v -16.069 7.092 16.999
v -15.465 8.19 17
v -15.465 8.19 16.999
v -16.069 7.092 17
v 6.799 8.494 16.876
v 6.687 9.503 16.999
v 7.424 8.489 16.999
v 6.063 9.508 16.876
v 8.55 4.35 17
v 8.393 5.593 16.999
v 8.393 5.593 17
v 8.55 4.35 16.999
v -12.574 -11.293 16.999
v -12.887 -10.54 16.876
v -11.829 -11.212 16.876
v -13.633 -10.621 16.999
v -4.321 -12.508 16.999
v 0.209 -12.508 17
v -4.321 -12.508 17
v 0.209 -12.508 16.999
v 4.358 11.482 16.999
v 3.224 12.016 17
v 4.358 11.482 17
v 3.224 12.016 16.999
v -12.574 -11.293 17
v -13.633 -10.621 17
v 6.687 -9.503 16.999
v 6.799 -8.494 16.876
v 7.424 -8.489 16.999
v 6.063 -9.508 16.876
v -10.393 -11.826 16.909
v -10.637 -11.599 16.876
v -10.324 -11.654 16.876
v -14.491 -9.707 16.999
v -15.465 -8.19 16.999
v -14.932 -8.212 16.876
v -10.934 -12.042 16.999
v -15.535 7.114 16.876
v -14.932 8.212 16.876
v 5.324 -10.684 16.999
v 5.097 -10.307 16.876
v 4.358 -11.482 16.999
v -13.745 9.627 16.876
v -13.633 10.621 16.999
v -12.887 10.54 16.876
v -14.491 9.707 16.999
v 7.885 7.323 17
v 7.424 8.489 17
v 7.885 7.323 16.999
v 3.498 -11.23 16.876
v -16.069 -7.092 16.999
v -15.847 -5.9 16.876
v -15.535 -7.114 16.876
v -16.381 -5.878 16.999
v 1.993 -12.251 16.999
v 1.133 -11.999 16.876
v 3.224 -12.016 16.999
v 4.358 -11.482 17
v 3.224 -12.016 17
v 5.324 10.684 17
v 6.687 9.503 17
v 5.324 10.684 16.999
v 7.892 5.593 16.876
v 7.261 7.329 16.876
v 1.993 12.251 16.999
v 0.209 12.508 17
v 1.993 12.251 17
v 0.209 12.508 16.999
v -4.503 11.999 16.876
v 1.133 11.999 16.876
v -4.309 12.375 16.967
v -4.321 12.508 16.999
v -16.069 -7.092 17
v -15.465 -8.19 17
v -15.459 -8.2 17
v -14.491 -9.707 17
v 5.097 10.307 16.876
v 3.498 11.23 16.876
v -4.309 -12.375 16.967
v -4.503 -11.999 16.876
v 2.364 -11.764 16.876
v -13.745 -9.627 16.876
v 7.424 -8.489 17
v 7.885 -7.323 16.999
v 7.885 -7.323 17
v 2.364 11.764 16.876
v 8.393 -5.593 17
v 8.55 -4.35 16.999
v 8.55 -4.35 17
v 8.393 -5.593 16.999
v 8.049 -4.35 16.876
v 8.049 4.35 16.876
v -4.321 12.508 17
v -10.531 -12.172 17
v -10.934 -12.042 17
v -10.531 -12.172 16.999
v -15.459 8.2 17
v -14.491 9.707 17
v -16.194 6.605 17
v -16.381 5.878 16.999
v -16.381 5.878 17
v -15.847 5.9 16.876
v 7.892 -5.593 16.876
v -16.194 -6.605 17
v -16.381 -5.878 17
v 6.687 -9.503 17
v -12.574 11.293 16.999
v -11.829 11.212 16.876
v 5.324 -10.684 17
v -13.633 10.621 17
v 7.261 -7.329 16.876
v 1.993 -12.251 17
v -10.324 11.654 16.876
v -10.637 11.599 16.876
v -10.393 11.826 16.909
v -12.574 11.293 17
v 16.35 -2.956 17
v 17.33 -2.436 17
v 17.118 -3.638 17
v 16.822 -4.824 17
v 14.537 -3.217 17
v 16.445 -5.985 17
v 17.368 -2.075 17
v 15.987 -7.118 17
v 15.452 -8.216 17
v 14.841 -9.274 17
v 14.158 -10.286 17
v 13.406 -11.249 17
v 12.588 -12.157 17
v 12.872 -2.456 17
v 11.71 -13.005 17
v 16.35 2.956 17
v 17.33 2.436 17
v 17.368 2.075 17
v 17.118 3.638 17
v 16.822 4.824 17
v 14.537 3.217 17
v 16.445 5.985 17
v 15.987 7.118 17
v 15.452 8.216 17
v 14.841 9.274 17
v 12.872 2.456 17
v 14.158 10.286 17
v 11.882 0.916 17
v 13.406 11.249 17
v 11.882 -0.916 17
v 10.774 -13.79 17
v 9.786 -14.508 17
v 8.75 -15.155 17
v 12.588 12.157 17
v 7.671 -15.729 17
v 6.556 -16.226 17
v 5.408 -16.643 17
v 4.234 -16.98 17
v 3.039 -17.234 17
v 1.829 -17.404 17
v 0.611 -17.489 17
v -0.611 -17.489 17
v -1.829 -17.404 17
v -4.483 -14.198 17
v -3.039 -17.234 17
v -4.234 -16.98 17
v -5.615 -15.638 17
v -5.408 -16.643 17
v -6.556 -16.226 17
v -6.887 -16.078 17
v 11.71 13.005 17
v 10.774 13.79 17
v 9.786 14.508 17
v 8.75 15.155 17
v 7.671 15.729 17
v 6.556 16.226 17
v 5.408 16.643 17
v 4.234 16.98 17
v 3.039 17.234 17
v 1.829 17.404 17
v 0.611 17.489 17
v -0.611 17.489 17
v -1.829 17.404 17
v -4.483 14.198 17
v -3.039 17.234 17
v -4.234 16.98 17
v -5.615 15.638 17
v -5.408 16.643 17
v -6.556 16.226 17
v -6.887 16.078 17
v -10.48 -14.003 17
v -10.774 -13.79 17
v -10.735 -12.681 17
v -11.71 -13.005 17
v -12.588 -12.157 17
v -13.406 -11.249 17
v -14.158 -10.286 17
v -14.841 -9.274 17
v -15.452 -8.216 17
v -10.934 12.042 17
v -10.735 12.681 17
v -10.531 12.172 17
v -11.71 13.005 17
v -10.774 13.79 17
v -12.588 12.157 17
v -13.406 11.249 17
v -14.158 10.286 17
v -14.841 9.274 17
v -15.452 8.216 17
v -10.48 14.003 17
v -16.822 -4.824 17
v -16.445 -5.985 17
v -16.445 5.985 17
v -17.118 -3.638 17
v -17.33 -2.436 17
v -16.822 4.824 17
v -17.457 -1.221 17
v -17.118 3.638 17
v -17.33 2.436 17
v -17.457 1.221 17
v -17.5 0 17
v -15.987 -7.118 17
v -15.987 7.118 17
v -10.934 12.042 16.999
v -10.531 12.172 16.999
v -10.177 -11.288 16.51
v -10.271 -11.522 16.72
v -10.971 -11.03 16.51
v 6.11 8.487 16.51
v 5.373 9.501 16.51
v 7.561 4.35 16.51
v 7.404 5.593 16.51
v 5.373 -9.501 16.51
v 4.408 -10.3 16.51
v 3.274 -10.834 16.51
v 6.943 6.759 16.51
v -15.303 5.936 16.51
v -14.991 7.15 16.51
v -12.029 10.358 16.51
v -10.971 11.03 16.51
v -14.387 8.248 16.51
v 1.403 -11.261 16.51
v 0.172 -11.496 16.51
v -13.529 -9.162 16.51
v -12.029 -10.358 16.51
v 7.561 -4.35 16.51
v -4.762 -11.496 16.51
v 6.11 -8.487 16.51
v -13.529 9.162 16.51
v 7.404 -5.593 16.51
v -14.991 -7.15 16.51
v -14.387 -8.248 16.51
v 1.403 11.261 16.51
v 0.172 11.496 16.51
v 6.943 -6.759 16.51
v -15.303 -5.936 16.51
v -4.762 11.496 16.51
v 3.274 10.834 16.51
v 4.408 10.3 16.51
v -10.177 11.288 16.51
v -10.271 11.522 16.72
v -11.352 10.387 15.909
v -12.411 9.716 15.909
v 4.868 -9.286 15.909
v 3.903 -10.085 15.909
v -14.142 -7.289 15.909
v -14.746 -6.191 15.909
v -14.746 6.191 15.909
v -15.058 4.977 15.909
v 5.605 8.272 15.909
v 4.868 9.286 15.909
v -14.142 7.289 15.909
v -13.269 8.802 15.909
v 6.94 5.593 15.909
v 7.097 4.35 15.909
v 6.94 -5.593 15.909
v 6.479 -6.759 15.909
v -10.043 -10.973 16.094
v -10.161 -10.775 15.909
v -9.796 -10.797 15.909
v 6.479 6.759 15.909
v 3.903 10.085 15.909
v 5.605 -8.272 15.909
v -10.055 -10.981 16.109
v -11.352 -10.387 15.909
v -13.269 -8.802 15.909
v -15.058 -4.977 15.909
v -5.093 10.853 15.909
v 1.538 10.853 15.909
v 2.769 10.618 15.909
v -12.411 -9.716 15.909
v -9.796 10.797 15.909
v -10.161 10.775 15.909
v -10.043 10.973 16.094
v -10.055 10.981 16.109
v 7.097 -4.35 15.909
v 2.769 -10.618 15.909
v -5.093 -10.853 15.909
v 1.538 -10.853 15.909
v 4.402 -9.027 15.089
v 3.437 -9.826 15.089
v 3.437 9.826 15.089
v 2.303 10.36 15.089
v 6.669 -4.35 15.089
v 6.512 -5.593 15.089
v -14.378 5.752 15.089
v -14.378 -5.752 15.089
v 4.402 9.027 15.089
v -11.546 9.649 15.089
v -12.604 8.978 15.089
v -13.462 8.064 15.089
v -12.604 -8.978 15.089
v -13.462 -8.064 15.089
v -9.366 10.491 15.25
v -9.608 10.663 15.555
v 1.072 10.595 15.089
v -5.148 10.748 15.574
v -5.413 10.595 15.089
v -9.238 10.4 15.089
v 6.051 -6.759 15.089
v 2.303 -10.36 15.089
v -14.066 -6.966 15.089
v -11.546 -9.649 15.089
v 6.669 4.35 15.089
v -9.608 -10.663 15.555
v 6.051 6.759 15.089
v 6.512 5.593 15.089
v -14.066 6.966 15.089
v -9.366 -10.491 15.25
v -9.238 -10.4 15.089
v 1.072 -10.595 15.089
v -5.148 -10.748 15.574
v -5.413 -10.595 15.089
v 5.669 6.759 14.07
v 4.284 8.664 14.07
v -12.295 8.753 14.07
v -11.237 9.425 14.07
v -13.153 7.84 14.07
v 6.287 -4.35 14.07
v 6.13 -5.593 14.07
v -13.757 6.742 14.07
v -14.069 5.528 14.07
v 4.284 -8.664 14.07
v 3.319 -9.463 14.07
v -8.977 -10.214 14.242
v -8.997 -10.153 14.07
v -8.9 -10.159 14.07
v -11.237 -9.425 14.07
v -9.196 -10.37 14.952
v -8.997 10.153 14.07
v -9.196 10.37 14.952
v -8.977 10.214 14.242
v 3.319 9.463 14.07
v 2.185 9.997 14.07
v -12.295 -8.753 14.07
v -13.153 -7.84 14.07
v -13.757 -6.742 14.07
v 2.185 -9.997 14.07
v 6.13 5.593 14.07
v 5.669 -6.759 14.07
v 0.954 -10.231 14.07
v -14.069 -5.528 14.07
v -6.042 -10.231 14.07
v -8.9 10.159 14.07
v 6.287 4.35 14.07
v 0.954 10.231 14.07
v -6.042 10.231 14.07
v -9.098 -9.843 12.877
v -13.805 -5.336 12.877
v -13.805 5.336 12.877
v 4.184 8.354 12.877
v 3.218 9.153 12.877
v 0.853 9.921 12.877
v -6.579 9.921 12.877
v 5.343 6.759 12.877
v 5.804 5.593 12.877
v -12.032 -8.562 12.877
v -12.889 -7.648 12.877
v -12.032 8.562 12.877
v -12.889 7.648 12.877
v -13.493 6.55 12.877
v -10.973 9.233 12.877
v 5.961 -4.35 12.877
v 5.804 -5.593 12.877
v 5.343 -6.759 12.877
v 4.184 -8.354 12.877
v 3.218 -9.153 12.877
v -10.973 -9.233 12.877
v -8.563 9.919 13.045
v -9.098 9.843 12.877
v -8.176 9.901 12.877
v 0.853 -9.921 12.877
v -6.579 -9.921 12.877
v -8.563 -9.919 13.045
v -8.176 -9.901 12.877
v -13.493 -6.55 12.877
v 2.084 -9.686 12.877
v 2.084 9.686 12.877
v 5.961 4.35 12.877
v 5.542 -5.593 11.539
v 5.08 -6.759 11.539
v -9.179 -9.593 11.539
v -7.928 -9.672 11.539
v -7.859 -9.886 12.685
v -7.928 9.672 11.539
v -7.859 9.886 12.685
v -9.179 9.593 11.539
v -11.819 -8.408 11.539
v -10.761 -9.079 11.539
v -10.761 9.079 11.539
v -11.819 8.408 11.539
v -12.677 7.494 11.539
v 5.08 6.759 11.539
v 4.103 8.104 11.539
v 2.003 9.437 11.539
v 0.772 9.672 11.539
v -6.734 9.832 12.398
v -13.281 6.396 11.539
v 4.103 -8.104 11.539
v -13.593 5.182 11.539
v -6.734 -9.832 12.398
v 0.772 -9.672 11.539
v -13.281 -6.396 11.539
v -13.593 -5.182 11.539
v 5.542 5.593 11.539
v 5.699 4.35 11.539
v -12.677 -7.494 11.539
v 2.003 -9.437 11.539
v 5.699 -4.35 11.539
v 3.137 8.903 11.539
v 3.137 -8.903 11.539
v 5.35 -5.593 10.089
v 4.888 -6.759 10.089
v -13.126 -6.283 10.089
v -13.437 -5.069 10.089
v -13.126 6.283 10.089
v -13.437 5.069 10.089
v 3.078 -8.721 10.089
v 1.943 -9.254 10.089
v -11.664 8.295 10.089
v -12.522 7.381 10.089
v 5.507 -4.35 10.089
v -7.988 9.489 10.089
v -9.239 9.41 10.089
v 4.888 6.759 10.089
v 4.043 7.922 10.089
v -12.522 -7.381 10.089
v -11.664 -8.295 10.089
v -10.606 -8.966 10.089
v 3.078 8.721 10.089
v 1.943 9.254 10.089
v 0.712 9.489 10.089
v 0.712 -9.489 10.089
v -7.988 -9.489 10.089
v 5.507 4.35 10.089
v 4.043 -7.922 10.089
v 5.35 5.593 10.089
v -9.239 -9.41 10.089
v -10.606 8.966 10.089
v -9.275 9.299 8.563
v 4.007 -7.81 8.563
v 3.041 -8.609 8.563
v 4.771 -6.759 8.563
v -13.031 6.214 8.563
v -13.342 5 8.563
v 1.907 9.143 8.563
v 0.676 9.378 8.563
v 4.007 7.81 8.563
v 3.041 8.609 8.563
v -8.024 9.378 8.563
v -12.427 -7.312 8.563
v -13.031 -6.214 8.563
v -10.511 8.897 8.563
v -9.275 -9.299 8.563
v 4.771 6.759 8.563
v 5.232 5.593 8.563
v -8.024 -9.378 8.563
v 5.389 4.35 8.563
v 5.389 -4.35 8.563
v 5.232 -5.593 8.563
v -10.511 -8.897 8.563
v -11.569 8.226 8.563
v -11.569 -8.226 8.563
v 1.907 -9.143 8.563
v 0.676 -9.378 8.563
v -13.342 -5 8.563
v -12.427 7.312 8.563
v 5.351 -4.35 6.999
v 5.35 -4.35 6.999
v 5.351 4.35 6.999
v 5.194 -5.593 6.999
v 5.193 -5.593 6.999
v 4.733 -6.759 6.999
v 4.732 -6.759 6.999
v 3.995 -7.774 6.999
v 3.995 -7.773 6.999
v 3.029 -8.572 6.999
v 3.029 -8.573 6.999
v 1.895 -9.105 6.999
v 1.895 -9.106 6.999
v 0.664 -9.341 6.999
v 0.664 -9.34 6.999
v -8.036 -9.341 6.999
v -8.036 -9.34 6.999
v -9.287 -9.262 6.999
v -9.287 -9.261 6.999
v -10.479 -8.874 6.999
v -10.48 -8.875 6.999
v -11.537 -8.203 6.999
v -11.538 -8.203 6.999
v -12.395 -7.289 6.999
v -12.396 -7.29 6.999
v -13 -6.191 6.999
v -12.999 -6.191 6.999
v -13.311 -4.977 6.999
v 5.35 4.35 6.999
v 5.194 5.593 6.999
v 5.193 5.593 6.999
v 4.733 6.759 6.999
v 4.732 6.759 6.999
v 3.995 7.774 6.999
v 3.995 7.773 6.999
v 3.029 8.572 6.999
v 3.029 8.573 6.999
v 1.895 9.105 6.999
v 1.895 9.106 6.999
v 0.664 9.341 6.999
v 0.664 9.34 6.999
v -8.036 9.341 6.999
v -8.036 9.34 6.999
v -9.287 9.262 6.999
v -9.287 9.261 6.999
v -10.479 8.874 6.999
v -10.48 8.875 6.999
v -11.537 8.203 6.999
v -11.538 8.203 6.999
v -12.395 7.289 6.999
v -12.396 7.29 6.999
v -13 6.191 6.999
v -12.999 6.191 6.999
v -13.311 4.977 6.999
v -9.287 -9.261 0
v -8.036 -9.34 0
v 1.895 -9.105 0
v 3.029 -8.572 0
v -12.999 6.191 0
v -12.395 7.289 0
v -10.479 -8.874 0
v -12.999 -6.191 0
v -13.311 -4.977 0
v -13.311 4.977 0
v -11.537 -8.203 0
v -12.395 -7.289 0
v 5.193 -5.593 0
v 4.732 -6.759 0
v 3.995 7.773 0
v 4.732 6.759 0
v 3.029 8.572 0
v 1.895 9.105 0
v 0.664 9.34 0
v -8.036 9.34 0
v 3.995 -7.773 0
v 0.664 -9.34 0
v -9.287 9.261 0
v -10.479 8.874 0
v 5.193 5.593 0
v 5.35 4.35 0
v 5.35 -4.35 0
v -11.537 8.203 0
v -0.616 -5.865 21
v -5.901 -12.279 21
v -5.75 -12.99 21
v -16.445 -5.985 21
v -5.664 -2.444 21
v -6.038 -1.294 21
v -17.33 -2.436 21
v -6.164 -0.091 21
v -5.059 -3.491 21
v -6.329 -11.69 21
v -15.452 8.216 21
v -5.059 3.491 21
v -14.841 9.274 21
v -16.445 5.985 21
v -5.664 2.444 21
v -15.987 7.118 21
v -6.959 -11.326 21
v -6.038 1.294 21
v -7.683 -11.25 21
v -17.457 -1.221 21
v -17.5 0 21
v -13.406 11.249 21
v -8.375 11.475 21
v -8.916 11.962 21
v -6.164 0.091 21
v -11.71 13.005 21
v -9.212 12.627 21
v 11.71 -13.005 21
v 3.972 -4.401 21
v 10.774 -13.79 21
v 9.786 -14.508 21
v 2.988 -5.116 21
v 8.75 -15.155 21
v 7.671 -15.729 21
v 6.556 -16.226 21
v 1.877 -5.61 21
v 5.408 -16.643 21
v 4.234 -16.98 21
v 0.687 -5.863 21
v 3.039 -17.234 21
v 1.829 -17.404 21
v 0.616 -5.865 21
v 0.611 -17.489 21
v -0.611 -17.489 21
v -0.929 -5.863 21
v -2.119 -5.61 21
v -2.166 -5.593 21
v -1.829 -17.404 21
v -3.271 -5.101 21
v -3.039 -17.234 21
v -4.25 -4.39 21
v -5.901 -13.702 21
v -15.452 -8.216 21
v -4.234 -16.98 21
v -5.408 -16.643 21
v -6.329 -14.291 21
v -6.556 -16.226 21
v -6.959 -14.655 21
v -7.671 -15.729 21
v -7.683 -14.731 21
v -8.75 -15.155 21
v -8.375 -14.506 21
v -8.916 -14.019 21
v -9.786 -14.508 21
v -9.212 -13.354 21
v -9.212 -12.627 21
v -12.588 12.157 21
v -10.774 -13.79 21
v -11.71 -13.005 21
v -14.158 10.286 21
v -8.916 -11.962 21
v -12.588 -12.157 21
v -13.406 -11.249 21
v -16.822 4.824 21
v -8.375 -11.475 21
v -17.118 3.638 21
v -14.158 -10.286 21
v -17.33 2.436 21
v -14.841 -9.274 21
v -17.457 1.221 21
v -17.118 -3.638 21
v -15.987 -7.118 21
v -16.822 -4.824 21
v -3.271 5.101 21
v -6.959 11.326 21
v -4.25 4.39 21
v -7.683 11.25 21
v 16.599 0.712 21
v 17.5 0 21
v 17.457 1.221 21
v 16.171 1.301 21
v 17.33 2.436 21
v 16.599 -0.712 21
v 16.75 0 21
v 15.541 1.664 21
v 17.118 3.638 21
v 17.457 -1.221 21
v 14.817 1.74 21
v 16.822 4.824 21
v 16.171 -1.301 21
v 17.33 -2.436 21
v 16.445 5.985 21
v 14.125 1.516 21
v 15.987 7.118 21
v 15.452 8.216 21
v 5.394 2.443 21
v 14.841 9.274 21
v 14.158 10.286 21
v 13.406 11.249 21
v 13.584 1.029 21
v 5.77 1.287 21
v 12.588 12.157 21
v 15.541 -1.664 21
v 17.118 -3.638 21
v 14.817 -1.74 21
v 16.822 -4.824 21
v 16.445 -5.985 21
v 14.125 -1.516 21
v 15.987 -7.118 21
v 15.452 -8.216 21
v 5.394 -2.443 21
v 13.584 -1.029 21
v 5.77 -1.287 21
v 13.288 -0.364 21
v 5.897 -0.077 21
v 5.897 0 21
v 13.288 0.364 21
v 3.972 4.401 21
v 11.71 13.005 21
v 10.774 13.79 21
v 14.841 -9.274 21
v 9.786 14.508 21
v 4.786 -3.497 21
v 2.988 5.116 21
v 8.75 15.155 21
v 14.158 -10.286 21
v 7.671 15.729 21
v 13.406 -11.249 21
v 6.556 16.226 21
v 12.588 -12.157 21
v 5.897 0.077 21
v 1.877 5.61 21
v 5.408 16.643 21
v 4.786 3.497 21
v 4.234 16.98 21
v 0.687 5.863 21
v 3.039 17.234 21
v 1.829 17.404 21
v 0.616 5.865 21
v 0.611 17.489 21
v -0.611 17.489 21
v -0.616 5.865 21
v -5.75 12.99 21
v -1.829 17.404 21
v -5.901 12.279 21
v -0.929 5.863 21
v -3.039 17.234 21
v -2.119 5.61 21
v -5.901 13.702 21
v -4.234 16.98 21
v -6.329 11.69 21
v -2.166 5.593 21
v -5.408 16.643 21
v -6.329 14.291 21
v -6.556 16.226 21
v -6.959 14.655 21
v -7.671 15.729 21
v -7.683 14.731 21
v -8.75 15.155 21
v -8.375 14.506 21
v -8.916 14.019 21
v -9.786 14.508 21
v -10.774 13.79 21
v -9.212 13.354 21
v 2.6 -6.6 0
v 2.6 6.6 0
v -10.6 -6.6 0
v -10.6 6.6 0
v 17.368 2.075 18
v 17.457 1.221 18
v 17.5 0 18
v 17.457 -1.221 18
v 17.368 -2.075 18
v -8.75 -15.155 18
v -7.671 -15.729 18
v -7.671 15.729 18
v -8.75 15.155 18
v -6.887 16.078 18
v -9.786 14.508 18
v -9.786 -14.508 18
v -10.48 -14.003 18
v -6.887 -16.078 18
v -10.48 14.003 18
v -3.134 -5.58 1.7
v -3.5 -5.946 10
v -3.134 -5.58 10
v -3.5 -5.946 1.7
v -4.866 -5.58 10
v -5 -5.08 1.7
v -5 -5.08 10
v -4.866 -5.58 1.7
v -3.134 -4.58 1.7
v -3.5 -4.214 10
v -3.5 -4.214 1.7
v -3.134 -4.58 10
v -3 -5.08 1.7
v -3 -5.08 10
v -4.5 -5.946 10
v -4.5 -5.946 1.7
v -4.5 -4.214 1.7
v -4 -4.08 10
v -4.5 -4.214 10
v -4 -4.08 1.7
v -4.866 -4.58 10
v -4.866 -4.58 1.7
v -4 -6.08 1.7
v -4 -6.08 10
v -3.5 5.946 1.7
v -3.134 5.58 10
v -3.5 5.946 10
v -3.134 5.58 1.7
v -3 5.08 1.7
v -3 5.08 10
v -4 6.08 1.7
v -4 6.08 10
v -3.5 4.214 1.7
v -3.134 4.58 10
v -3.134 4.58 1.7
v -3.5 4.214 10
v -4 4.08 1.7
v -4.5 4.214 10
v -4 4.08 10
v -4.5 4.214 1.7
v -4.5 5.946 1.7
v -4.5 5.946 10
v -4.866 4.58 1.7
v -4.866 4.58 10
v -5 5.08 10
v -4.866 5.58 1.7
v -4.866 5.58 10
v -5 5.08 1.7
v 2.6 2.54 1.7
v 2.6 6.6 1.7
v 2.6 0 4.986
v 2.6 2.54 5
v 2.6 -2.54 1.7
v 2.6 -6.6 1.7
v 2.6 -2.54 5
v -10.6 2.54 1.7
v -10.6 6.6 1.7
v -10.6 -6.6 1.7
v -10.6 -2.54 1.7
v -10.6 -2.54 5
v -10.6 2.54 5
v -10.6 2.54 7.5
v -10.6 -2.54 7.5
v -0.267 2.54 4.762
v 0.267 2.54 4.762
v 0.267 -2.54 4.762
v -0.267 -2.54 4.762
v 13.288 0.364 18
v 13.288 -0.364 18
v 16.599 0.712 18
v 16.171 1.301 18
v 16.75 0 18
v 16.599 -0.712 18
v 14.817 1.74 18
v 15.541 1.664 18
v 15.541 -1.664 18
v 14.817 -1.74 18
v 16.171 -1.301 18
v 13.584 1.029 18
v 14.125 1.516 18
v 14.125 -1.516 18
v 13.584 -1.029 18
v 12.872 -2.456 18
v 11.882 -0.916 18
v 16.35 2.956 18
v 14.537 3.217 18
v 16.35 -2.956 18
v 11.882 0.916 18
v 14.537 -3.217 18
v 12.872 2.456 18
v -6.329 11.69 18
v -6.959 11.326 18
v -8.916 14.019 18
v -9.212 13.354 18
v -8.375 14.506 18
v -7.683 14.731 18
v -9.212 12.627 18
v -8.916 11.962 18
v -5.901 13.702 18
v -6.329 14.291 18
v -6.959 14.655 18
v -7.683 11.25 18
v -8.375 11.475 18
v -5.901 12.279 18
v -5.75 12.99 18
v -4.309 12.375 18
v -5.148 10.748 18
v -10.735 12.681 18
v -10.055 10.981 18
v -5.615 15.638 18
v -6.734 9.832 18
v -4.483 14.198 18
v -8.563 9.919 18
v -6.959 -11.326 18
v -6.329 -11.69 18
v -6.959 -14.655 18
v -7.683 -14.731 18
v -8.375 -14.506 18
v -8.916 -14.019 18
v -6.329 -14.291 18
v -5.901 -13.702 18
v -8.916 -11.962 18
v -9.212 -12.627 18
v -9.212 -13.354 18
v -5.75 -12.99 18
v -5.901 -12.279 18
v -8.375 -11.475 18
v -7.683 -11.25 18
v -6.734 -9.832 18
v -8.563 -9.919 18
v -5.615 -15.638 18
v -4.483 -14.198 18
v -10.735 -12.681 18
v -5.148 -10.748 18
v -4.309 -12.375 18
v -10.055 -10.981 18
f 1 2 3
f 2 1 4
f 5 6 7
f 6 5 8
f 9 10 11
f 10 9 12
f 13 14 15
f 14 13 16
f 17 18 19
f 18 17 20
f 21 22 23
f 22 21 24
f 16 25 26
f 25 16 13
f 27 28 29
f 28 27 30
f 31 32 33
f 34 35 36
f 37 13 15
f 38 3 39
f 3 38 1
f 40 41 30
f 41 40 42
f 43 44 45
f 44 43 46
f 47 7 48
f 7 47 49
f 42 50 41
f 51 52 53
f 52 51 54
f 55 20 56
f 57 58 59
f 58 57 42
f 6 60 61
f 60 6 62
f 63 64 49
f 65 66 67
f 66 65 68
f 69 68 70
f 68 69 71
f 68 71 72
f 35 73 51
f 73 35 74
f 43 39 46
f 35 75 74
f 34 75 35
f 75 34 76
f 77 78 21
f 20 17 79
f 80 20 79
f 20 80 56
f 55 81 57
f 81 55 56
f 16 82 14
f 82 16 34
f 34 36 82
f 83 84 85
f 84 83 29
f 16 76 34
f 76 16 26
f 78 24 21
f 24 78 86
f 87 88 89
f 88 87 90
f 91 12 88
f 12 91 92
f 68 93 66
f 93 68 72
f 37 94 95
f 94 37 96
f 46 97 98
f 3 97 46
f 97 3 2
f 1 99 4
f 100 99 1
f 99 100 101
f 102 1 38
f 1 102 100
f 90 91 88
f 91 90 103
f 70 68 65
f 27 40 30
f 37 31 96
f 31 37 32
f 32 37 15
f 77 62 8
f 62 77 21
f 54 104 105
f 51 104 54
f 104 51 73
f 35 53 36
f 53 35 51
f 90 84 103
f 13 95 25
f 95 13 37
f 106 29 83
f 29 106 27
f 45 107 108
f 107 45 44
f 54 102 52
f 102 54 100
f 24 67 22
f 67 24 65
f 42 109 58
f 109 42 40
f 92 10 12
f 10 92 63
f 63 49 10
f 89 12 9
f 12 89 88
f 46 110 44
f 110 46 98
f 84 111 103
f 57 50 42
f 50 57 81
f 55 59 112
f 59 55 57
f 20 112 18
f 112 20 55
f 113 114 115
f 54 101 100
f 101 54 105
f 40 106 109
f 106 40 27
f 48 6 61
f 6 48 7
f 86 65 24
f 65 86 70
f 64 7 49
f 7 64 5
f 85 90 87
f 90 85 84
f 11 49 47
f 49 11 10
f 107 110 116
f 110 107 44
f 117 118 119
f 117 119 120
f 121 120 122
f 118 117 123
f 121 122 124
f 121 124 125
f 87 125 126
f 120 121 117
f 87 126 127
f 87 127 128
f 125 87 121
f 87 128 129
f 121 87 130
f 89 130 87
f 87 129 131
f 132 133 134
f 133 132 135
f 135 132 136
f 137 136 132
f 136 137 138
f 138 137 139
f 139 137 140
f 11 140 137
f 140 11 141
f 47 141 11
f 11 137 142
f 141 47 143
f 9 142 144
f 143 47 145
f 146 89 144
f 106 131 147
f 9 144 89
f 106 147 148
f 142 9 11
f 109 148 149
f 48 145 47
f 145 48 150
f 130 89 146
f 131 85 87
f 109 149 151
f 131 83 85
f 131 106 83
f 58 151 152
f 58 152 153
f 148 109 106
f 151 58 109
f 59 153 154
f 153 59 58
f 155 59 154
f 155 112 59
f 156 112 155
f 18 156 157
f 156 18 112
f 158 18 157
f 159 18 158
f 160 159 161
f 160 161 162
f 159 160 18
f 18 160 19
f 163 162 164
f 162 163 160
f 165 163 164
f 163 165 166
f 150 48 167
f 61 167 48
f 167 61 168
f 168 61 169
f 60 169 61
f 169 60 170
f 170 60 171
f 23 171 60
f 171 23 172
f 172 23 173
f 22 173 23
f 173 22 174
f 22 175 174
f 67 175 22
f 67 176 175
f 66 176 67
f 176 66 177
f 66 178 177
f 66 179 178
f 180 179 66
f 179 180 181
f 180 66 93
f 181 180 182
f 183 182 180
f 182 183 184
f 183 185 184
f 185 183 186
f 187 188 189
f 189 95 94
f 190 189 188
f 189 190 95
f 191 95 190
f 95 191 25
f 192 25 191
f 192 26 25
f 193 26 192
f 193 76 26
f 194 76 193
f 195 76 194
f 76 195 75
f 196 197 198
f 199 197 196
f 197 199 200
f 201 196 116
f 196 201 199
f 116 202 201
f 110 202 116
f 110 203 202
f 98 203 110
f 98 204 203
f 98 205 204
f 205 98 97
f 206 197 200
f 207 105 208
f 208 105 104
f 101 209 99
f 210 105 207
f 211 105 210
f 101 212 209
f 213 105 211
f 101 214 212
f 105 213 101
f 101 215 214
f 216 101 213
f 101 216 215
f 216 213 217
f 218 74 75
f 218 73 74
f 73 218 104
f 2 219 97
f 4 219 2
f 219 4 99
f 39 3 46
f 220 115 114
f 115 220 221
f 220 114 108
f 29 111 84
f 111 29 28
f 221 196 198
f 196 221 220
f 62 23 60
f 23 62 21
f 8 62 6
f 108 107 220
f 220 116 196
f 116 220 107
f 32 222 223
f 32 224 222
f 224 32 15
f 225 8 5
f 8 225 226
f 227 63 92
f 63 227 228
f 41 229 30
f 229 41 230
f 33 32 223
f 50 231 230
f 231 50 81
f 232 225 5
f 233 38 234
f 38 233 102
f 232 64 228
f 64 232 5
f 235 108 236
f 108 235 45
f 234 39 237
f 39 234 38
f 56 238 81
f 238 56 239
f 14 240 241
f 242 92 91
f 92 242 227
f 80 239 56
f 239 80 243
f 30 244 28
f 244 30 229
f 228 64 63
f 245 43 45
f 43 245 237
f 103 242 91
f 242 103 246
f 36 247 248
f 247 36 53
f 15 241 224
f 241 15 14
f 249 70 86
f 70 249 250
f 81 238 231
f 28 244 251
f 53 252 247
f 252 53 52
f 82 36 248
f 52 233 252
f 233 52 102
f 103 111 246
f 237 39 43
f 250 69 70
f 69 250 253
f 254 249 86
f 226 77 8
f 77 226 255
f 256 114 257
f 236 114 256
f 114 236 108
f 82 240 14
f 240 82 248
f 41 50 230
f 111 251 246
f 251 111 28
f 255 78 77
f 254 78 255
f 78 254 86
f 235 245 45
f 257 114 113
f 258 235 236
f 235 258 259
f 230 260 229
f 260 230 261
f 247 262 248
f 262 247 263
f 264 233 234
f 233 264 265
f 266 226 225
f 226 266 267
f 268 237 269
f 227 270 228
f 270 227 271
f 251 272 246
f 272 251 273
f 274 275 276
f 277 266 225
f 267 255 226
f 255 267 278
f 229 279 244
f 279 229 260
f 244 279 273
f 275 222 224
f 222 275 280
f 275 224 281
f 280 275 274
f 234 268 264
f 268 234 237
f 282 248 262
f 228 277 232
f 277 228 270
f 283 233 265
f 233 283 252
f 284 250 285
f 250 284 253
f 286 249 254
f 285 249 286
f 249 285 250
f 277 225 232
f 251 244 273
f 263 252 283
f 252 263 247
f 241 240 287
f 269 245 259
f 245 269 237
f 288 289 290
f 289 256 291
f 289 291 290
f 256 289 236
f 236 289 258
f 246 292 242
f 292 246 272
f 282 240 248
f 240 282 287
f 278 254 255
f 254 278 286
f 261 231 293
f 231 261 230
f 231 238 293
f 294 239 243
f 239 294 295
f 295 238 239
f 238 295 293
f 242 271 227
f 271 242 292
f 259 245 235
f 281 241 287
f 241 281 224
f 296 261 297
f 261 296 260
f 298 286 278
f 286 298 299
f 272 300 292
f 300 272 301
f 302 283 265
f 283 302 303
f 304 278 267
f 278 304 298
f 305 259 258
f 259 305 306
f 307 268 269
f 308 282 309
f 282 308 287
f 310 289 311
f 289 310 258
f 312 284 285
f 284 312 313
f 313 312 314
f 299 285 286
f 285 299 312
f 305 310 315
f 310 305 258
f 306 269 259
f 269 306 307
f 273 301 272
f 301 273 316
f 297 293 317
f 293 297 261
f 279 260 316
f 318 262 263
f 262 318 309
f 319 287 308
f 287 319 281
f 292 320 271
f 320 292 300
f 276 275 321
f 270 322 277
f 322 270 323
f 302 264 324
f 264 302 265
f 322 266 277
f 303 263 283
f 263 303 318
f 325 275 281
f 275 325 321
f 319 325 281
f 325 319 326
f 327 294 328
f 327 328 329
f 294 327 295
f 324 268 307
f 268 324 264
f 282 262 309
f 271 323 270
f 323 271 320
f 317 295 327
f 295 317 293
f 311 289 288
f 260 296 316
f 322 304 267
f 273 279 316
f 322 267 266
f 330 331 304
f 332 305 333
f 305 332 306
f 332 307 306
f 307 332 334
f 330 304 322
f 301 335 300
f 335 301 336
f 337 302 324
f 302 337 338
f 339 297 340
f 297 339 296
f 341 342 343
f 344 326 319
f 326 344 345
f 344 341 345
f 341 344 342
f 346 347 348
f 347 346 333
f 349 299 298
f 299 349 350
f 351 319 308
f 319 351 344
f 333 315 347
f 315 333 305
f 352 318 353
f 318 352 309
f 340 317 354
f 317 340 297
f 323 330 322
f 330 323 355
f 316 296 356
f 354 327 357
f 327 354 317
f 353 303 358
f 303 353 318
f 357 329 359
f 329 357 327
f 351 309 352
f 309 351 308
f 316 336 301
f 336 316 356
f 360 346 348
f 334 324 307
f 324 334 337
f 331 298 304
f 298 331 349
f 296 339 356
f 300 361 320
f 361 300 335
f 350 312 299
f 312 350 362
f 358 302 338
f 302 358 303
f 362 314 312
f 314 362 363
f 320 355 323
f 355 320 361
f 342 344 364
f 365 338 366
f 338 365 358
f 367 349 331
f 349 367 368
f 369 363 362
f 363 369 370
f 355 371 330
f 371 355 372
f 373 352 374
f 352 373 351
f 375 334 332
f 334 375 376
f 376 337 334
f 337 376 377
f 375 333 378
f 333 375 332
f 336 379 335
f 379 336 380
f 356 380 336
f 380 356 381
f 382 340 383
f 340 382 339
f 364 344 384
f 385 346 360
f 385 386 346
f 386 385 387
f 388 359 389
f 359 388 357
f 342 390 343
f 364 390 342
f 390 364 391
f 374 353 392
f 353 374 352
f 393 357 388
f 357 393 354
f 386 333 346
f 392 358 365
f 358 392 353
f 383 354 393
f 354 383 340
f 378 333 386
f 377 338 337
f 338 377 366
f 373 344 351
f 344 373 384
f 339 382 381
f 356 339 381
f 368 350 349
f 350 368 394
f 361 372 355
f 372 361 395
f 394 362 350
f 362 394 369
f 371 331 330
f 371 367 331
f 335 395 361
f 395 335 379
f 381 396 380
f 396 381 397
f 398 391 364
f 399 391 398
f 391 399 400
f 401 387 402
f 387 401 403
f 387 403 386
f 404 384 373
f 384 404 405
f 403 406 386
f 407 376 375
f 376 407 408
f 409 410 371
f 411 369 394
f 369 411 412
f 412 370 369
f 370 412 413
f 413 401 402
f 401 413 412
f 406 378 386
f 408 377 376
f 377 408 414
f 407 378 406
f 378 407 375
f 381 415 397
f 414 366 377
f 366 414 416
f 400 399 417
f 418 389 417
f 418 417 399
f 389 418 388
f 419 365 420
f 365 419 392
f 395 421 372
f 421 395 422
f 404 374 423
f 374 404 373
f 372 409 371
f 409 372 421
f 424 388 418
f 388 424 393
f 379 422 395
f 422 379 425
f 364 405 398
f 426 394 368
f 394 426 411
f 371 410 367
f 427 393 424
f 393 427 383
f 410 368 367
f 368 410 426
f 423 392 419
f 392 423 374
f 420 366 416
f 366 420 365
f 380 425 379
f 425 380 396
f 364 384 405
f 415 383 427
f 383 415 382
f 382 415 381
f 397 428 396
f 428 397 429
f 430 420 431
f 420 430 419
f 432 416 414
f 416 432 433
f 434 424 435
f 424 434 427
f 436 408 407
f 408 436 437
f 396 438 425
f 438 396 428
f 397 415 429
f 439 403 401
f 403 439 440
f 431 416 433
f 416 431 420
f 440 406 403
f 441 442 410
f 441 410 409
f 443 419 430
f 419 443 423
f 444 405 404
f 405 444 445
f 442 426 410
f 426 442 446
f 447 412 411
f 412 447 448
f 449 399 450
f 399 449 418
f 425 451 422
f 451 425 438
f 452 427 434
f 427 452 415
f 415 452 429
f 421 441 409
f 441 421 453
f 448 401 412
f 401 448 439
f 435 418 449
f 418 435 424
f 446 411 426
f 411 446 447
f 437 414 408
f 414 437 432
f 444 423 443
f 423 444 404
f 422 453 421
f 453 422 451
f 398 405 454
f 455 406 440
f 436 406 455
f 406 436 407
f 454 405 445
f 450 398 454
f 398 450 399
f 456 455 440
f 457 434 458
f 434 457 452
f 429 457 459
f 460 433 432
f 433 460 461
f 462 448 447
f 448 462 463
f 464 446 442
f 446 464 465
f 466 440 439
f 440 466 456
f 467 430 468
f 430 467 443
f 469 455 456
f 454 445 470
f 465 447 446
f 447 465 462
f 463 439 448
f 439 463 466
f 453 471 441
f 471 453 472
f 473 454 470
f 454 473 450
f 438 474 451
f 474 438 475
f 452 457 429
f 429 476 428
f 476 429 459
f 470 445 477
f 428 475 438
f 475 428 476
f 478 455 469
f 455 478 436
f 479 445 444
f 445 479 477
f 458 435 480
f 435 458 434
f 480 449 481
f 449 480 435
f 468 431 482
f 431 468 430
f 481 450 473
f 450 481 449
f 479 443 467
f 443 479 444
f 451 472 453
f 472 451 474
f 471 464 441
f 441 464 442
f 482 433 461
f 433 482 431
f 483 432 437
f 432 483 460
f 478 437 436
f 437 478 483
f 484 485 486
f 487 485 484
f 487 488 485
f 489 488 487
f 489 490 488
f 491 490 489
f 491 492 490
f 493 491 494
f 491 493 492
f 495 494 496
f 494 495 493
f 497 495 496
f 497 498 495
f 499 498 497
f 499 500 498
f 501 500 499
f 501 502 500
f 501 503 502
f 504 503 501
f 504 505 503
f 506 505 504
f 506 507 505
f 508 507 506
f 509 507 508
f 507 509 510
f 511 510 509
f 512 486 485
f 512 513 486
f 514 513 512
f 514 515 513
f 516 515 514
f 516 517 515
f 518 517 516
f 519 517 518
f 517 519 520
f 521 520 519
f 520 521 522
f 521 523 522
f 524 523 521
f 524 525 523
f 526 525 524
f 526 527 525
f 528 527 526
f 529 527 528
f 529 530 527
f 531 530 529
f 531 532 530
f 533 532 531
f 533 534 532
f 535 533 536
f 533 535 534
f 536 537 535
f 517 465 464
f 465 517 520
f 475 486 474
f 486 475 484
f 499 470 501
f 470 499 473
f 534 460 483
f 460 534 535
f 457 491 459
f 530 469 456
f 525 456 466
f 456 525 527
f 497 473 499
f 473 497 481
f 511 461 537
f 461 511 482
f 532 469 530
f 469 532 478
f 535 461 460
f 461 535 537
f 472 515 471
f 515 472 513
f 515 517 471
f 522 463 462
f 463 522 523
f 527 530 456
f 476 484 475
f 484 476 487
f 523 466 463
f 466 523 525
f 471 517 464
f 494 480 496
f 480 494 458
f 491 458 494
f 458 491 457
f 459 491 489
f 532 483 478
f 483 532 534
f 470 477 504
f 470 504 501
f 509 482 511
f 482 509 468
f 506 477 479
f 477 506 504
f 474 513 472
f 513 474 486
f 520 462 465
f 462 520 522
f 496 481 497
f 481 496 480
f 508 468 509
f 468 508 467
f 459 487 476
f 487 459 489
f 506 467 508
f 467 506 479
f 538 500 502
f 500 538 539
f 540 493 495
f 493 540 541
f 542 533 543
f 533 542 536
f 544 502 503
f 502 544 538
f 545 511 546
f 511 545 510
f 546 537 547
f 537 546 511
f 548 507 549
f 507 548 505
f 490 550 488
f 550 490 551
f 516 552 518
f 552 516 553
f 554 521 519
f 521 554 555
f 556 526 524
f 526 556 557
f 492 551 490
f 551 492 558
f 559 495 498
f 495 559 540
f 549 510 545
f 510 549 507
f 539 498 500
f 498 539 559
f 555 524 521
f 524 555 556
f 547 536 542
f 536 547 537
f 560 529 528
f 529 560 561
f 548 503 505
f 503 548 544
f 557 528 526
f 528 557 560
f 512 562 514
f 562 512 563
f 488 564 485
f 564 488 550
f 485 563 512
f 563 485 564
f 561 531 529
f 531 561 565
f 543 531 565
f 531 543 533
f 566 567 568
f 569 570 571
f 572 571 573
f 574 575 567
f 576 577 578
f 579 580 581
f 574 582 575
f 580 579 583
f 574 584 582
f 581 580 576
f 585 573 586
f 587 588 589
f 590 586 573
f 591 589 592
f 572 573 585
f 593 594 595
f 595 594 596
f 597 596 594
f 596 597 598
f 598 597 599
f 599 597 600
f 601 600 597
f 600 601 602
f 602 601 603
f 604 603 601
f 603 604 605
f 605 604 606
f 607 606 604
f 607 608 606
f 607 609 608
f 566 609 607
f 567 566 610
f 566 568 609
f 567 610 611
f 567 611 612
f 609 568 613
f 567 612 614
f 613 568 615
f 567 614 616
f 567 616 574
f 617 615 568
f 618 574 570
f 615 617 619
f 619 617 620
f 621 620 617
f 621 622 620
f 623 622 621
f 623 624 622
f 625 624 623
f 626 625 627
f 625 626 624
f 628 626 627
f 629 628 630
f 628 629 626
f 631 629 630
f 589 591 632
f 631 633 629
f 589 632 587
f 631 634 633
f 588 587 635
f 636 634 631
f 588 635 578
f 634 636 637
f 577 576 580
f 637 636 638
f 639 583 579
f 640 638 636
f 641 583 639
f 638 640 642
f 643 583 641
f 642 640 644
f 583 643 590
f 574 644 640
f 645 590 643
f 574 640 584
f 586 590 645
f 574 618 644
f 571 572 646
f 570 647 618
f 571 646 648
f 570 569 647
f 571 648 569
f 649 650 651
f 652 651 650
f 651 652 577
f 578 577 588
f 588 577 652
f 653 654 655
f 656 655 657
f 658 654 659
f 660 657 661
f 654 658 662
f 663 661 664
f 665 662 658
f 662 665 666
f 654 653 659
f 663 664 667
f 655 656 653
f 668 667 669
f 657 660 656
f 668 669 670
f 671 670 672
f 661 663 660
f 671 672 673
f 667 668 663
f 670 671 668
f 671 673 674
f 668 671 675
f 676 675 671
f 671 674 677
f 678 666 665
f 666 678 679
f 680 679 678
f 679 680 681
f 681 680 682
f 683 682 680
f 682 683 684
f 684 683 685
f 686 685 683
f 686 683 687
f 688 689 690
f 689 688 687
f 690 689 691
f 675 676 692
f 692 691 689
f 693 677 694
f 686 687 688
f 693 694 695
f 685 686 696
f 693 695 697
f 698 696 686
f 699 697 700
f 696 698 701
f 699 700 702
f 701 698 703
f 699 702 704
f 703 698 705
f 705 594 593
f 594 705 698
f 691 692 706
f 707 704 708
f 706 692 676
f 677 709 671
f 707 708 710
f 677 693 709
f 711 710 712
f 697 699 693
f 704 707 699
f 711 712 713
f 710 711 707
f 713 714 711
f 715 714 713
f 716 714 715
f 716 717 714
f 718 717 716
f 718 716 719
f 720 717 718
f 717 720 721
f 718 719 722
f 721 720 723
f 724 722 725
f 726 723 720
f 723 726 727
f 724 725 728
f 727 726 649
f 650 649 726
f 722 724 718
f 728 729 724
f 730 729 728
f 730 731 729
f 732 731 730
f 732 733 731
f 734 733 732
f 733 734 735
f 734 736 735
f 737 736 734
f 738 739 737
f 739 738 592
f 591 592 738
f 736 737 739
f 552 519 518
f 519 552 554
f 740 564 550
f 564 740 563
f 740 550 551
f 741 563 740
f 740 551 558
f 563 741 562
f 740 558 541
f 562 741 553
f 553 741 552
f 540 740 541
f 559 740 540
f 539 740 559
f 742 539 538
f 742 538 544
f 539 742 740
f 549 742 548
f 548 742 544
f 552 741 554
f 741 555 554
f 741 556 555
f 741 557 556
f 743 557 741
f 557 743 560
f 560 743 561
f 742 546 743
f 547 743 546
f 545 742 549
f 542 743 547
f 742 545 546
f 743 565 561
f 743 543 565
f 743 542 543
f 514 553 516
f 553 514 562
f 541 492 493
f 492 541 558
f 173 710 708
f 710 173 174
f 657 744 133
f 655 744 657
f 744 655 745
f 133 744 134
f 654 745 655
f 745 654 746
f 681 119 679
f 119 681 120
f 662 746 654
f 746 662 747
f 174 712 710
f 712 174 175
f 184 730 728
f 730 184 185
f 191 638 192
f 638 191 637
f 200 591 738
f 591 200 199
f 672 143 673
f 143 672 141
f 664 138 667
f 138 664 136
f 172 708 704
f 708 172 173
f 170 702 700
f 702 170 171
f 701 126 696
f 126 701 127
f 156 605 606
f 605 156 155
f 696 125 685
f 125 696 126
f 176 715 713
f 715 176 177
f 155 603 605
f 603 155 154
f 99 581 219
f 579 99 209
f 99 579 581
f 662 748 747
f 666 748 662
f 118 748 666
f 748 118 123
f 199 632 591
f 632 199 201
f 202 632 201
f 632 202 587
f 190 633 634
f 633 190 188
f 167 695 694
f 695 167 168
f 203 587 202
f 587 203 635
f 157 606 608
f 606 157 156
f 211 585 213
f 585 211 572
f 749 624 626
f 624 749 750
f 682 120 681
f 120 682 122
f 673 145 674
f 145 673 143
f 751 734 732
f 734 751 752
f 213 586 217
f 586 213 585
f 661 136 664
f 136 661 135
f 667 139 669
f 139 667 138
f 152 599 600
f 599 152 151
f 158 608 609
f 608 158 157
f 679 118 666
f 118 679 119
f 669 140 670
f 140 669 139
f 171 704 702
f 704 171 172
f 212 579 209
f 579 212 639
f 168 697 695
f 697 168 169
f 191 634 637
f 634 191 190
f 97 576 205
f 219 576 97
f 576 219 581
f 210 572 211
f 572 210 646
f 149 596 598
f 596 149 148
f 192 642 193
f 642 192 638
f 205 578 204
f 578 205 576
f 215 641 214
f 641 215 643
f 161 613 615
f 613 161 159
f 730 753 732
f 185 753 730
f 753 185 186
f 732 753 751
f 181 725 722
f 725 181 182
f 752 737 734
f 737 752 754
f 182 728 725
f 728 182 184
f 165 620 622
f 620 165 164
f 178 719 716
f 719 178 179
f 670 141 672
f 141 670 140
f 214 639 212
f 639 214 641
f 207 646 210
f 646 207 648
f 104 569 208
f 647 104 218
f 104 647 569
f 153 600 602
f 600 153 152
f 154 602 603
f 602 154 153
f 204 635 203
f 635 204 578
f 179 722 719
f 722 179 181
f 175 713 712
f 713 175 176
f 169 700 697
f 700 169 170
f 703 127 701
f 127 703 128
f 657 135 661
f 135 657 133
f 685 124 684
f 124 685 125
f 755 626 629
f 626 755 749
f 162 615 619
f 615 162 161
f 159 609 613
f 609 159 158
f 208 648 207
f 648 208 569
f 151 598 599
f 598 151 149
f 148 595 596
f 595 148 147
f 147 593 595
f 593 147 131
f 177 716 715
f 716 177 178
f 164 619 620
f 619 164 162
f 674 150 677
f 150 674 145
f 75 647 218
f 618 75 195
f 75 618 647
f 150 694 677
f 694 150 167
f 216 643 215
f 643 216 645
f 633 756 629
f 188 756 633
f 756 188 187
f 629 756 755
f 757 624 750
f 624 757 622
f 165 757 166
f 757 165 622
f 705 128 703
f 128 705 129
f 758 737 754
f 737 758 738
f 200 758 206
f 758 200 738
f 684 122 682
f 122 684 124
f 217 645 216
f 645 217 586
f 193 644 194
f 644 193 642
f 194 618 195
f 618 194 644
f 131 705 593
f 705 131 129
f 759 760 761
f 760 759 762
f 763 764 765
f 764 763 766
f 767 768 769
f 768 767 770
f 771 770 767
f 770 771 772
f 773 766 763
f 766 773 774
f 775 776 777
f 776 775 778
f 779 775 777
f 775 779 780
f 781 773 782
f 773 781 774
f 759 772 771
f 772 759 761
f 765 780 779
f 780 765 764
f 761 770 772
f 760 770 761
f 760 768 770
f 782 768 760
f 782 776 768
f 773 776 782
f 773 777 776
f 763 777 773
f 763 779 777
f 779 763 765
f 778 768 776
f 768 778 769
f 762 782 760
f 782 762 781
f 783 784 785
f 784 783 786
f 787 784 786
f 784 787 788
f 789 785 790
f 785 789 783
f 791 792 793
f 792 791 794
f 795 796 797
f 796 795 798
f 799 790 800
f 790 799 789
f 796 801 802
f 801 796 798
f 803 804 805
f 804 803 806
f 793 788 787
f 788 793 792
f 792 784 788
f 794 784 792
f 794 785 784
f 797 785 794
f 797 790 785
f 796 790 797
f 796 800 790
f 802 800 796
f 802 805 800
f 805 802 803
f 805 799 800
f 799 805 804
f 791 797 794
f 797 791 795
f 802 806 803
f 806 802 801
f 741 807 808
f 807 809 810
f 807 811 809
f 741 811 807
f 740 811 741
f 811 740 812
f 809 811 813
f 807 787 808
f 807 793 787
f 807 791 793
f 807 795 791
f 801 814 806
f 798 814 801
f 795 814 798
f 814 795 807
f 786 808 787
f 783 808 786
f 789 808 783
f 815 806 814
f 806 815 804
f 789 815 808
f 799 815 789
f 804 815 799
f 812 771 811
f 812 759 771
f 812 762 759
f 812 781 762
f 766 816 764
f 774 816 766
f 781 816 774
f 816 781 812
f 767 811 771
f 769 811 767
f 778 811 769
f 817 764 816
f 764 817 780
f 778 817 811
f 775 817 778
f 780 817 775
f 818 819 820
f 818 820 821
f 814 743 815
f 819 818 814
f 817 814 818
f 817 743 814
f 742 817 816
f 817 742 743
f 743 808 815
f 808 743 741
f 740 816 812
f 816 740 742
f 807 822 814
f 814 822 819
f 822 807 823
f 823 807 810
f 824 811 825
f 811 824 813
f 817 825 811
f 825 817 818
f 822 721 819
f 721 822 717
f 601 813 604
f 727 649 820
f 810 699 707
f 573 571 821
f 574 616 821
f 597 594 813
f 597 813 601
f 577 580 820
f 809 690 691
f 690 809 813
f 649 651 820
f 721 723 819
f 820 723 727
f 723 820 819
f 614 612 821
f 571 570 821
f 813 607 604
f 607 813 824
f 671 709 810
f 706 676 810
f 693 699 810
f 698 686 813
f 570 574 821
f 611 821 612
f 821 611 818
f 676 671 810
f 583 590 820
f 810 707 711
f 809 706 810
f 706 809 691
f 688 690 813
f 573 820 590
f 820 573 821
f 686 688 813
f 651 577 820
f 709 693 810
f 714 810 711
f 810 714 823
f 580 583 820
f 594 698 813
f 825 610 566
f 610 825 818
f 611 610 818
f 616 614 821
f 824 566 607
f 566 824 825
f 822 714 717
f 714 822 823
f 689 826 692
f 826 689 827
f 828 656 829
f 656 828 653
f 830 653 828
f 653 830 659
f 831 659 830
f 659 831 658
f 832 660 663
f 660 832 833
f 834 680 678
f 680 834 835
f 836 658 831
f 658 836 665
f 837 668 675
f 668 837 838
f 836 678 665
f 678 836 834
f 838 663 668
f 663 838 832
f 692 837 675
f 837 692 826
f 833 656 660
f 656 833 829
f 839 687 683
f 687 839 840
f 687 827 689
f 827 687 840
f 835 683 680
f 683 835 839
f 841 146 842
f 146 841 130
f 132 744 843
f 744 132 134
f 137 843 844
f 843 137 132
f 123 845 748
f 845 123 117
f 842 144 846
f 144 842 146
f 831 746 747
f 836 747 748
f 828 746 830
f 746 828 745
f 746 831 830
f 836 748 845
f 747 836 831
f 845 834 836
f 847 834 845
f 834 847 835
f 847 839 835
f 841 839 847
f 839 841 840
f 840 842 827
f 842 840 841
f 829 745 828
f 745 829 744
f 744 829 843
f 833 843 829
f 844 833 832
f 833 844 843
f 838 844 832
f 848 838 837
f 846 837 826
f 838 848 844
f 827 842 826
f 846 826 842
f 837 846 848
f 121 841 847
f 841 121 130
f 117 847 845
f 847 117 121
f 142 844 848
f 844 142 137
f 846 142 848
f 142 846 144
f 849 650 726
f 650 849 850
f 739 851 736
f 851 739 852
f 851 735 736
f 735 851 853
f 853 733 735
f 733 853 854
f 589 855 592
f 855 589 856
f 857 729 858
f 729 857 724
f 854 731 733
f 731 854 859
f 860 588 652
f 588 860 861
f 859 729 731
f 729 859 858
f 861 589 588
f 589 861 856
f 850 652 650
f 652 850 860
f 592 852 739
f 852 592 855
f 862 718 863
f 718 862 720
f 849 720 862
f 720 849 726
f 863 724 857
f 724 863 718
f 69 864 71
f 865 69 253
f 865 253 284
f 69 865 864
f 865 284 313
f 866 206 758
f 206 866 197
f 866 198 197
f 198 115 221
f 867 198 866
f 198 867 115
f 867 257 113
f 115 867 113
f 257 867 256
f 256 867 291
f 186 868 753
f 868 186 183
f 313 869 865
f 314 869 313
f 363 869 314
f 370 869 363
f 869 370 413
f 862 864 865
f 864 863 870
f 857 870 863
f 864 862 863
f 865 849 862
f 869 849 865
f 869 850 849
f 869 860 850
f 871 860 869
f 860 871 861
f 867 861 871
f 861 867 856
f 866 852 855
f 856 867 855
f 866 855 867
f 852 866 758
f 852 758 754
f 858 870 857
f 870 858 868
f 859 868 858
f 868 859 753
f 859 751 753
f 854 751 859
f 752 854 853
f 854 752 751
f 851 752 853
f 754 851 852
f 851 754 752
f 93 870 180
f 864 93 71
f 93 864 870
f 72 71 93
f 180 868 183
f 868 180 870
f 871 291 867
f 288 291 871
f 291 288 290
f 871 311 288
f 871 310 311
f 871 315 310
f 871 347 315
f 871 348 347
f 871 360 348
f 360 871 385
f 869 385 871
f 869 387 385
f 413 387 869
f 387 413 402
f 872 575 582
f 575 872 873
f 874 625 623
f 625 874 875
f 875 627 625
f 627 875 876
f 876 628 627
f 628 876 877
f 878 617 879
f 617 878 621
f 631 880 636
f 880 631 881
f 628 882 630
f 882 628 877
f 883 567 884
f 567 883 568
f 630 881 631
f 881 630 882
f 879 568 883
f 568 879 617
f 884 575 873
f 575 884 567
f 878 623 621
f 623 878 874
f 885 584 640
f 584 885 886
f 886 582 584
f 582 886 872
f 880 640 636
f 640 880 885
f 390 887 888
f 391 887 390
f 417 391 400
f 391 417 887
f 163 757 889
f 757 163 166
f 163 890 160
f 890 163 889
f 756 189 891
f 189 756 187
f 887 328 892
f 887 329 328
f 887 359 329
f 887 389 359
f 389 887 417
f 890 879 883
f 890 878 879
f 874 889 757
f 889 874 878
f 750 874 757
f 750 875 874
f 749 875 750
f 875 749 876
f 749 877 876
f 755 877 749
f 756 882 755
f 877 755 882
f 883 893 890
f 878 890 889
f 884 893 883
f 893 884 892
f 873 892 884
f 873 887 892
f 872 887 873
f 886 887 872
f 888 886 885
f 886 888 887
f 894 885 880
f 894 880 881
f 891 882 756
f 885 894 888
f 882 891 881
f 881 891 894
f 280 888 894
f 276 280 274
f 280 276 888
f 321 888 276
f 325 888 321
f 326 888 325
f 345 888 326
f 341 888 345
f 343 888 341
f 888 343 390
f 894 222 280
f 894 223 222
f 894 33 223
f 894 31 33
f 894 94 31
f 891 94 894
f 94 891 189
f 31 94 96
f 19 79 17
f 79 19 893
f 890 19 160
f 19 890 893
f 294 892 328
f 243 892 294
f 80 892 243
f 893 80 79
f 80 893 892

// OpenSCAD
module d2hw_a201d()
{
    fp=11.2;
    op=10.4; // travel 0.8mm
    di=1.7;
    hb=7;
    translate([-13.3/2,-5.3/2,.5])
        color([.2,.2,.2])cube([13.3,5.3,6.5]);
    for(i=[-1,0,1]) translate([5.08*i,0,-2.5]) cylinder(d=.8,h=3);
    translate([4,0,hb]) {
        color([.2,.2,.2]) { cylinder(d=di,h=fp-hb-di/2,$fn=10);
            cylinder(d1=5.3,d2=di*2.5,h=(fp-hb)/4);
            translate([0,0,fp-hb-di/2]) sphere(d=di,$fn=10); }
        color([.2,.2,.5]) { cylinder(d=di*1.5,h=(fp-hb)/1.5);
            cylinder(d=di*2.2,h=(fp-hb)/2);
        }
    }
}

module d2hw_pcb()
{
    pcbh=1.7;
    pcbsz=12.7;
    rotate([180,0,0]) d2hw_a201d();
    color([.2,.6,.2]) translate([0,0,pcbh/2])
        difference() { cube([pcbsz,pcbsz,pcbh],center=true);
            for(i=[-1,1]) translate([0,5.08*i,0]) 
                cylinder(d=2.5,h=pcbh*2,center=true,$fn=12);
        }
}

module d2hw_pcbholder(h=28)
{
    pcbh=1.7;
    pcbsz=12.7;
    ofs=4;
    szx=pcbsz+6;
    szy=pcbsz+6;
    mnth=4;
    
    module frame1() {
        let(d=10) hull() for(x=[-1,1]) for(y=[-1,1])
                translate([x*(szx-d)/2-ofs,y*(szy-d)/2,0]) cylinder(d=d,h=h,$fn=25);
    }
    module frame2() {
        translate([0,0,h-mnth]) cylinder(d=35,h=mnth,$fn=90);
    }
    module pcbmnt() {
        tol=0.5;
        dm=5.08;
        th=10;
        pcbx=pcbsz+tol;
        
        for(x=[-ofs]) for(y=[-dm,dm])
            translate([x,y,0]) cylinder(d=2,h=th,$fn=12);
        translate([-ofs,0,0]) {
            cube([pcbx,pcbsz+tol,pcbh*2],center=true);
            cube([pcbx,dm,th], center=true);
        }
        hull() {
            translate([0,0,th/2-.5]) cylinder(d1=5,d2=12,h=1+h-th/2,$fn=30);
            translate([-ofs-pcbx/2,-dm/2,th/2]) cube([pcbx,dm,th/4]);
        }
    }
    module bevl() {
        translate([0,0,h]) rotate([180,0,0]) 
        bevel(mnth,10,3.2,10) 
        rotate([180,0,0]) translate([0,0,-h]) frame1();
    }
    module bolts() {
        for(a=[0,120,240]) rotate([0,0,a]) translate([30/2,0,0]) {
            cylinder(d=3.5,h=h+1,$fn=15);
            cylinder(d=6.5,h=h-3);
        }
    }
    difference() {
        union() { frame1(); frame2(); bevl(); }
        pcbmnt();
        bolts();
    }
}

module bevel(h,h_bevel,r_bevel,fn)
{
    eps=0.001;
    function h_bev(i)=h_bevel*(1-cos(90*i));
    function r_bev(i)=((i==1)?eps:0)+r_bevel*(1-sin(90*i));
    module temp(hx,r) translate([0,0,hx]) linear_extrude(height=eps)
        minkowski() { projection(cut=true)translate([0,0,-h-hx]) children();
           circle(r); } 
	translate([0,0,h])
    for(j=[0:fn-1]) let(i1=j/fn,i2=(j+1)/fn,h1=h_bev(i1),h2=h_bev(i2))
        hull() {
            temp(h_bev(i1), r_bev(i1)) children();
            temp(h_bev(i2), r_bev(i2)) children();  }
}

//translate([-4,0,0]) d2hw_pcb();
//intersection()
{
//   translate([-100*0,-50,0]) cube([100,100,100]);
    d2hw_pcbholder(21);
}
